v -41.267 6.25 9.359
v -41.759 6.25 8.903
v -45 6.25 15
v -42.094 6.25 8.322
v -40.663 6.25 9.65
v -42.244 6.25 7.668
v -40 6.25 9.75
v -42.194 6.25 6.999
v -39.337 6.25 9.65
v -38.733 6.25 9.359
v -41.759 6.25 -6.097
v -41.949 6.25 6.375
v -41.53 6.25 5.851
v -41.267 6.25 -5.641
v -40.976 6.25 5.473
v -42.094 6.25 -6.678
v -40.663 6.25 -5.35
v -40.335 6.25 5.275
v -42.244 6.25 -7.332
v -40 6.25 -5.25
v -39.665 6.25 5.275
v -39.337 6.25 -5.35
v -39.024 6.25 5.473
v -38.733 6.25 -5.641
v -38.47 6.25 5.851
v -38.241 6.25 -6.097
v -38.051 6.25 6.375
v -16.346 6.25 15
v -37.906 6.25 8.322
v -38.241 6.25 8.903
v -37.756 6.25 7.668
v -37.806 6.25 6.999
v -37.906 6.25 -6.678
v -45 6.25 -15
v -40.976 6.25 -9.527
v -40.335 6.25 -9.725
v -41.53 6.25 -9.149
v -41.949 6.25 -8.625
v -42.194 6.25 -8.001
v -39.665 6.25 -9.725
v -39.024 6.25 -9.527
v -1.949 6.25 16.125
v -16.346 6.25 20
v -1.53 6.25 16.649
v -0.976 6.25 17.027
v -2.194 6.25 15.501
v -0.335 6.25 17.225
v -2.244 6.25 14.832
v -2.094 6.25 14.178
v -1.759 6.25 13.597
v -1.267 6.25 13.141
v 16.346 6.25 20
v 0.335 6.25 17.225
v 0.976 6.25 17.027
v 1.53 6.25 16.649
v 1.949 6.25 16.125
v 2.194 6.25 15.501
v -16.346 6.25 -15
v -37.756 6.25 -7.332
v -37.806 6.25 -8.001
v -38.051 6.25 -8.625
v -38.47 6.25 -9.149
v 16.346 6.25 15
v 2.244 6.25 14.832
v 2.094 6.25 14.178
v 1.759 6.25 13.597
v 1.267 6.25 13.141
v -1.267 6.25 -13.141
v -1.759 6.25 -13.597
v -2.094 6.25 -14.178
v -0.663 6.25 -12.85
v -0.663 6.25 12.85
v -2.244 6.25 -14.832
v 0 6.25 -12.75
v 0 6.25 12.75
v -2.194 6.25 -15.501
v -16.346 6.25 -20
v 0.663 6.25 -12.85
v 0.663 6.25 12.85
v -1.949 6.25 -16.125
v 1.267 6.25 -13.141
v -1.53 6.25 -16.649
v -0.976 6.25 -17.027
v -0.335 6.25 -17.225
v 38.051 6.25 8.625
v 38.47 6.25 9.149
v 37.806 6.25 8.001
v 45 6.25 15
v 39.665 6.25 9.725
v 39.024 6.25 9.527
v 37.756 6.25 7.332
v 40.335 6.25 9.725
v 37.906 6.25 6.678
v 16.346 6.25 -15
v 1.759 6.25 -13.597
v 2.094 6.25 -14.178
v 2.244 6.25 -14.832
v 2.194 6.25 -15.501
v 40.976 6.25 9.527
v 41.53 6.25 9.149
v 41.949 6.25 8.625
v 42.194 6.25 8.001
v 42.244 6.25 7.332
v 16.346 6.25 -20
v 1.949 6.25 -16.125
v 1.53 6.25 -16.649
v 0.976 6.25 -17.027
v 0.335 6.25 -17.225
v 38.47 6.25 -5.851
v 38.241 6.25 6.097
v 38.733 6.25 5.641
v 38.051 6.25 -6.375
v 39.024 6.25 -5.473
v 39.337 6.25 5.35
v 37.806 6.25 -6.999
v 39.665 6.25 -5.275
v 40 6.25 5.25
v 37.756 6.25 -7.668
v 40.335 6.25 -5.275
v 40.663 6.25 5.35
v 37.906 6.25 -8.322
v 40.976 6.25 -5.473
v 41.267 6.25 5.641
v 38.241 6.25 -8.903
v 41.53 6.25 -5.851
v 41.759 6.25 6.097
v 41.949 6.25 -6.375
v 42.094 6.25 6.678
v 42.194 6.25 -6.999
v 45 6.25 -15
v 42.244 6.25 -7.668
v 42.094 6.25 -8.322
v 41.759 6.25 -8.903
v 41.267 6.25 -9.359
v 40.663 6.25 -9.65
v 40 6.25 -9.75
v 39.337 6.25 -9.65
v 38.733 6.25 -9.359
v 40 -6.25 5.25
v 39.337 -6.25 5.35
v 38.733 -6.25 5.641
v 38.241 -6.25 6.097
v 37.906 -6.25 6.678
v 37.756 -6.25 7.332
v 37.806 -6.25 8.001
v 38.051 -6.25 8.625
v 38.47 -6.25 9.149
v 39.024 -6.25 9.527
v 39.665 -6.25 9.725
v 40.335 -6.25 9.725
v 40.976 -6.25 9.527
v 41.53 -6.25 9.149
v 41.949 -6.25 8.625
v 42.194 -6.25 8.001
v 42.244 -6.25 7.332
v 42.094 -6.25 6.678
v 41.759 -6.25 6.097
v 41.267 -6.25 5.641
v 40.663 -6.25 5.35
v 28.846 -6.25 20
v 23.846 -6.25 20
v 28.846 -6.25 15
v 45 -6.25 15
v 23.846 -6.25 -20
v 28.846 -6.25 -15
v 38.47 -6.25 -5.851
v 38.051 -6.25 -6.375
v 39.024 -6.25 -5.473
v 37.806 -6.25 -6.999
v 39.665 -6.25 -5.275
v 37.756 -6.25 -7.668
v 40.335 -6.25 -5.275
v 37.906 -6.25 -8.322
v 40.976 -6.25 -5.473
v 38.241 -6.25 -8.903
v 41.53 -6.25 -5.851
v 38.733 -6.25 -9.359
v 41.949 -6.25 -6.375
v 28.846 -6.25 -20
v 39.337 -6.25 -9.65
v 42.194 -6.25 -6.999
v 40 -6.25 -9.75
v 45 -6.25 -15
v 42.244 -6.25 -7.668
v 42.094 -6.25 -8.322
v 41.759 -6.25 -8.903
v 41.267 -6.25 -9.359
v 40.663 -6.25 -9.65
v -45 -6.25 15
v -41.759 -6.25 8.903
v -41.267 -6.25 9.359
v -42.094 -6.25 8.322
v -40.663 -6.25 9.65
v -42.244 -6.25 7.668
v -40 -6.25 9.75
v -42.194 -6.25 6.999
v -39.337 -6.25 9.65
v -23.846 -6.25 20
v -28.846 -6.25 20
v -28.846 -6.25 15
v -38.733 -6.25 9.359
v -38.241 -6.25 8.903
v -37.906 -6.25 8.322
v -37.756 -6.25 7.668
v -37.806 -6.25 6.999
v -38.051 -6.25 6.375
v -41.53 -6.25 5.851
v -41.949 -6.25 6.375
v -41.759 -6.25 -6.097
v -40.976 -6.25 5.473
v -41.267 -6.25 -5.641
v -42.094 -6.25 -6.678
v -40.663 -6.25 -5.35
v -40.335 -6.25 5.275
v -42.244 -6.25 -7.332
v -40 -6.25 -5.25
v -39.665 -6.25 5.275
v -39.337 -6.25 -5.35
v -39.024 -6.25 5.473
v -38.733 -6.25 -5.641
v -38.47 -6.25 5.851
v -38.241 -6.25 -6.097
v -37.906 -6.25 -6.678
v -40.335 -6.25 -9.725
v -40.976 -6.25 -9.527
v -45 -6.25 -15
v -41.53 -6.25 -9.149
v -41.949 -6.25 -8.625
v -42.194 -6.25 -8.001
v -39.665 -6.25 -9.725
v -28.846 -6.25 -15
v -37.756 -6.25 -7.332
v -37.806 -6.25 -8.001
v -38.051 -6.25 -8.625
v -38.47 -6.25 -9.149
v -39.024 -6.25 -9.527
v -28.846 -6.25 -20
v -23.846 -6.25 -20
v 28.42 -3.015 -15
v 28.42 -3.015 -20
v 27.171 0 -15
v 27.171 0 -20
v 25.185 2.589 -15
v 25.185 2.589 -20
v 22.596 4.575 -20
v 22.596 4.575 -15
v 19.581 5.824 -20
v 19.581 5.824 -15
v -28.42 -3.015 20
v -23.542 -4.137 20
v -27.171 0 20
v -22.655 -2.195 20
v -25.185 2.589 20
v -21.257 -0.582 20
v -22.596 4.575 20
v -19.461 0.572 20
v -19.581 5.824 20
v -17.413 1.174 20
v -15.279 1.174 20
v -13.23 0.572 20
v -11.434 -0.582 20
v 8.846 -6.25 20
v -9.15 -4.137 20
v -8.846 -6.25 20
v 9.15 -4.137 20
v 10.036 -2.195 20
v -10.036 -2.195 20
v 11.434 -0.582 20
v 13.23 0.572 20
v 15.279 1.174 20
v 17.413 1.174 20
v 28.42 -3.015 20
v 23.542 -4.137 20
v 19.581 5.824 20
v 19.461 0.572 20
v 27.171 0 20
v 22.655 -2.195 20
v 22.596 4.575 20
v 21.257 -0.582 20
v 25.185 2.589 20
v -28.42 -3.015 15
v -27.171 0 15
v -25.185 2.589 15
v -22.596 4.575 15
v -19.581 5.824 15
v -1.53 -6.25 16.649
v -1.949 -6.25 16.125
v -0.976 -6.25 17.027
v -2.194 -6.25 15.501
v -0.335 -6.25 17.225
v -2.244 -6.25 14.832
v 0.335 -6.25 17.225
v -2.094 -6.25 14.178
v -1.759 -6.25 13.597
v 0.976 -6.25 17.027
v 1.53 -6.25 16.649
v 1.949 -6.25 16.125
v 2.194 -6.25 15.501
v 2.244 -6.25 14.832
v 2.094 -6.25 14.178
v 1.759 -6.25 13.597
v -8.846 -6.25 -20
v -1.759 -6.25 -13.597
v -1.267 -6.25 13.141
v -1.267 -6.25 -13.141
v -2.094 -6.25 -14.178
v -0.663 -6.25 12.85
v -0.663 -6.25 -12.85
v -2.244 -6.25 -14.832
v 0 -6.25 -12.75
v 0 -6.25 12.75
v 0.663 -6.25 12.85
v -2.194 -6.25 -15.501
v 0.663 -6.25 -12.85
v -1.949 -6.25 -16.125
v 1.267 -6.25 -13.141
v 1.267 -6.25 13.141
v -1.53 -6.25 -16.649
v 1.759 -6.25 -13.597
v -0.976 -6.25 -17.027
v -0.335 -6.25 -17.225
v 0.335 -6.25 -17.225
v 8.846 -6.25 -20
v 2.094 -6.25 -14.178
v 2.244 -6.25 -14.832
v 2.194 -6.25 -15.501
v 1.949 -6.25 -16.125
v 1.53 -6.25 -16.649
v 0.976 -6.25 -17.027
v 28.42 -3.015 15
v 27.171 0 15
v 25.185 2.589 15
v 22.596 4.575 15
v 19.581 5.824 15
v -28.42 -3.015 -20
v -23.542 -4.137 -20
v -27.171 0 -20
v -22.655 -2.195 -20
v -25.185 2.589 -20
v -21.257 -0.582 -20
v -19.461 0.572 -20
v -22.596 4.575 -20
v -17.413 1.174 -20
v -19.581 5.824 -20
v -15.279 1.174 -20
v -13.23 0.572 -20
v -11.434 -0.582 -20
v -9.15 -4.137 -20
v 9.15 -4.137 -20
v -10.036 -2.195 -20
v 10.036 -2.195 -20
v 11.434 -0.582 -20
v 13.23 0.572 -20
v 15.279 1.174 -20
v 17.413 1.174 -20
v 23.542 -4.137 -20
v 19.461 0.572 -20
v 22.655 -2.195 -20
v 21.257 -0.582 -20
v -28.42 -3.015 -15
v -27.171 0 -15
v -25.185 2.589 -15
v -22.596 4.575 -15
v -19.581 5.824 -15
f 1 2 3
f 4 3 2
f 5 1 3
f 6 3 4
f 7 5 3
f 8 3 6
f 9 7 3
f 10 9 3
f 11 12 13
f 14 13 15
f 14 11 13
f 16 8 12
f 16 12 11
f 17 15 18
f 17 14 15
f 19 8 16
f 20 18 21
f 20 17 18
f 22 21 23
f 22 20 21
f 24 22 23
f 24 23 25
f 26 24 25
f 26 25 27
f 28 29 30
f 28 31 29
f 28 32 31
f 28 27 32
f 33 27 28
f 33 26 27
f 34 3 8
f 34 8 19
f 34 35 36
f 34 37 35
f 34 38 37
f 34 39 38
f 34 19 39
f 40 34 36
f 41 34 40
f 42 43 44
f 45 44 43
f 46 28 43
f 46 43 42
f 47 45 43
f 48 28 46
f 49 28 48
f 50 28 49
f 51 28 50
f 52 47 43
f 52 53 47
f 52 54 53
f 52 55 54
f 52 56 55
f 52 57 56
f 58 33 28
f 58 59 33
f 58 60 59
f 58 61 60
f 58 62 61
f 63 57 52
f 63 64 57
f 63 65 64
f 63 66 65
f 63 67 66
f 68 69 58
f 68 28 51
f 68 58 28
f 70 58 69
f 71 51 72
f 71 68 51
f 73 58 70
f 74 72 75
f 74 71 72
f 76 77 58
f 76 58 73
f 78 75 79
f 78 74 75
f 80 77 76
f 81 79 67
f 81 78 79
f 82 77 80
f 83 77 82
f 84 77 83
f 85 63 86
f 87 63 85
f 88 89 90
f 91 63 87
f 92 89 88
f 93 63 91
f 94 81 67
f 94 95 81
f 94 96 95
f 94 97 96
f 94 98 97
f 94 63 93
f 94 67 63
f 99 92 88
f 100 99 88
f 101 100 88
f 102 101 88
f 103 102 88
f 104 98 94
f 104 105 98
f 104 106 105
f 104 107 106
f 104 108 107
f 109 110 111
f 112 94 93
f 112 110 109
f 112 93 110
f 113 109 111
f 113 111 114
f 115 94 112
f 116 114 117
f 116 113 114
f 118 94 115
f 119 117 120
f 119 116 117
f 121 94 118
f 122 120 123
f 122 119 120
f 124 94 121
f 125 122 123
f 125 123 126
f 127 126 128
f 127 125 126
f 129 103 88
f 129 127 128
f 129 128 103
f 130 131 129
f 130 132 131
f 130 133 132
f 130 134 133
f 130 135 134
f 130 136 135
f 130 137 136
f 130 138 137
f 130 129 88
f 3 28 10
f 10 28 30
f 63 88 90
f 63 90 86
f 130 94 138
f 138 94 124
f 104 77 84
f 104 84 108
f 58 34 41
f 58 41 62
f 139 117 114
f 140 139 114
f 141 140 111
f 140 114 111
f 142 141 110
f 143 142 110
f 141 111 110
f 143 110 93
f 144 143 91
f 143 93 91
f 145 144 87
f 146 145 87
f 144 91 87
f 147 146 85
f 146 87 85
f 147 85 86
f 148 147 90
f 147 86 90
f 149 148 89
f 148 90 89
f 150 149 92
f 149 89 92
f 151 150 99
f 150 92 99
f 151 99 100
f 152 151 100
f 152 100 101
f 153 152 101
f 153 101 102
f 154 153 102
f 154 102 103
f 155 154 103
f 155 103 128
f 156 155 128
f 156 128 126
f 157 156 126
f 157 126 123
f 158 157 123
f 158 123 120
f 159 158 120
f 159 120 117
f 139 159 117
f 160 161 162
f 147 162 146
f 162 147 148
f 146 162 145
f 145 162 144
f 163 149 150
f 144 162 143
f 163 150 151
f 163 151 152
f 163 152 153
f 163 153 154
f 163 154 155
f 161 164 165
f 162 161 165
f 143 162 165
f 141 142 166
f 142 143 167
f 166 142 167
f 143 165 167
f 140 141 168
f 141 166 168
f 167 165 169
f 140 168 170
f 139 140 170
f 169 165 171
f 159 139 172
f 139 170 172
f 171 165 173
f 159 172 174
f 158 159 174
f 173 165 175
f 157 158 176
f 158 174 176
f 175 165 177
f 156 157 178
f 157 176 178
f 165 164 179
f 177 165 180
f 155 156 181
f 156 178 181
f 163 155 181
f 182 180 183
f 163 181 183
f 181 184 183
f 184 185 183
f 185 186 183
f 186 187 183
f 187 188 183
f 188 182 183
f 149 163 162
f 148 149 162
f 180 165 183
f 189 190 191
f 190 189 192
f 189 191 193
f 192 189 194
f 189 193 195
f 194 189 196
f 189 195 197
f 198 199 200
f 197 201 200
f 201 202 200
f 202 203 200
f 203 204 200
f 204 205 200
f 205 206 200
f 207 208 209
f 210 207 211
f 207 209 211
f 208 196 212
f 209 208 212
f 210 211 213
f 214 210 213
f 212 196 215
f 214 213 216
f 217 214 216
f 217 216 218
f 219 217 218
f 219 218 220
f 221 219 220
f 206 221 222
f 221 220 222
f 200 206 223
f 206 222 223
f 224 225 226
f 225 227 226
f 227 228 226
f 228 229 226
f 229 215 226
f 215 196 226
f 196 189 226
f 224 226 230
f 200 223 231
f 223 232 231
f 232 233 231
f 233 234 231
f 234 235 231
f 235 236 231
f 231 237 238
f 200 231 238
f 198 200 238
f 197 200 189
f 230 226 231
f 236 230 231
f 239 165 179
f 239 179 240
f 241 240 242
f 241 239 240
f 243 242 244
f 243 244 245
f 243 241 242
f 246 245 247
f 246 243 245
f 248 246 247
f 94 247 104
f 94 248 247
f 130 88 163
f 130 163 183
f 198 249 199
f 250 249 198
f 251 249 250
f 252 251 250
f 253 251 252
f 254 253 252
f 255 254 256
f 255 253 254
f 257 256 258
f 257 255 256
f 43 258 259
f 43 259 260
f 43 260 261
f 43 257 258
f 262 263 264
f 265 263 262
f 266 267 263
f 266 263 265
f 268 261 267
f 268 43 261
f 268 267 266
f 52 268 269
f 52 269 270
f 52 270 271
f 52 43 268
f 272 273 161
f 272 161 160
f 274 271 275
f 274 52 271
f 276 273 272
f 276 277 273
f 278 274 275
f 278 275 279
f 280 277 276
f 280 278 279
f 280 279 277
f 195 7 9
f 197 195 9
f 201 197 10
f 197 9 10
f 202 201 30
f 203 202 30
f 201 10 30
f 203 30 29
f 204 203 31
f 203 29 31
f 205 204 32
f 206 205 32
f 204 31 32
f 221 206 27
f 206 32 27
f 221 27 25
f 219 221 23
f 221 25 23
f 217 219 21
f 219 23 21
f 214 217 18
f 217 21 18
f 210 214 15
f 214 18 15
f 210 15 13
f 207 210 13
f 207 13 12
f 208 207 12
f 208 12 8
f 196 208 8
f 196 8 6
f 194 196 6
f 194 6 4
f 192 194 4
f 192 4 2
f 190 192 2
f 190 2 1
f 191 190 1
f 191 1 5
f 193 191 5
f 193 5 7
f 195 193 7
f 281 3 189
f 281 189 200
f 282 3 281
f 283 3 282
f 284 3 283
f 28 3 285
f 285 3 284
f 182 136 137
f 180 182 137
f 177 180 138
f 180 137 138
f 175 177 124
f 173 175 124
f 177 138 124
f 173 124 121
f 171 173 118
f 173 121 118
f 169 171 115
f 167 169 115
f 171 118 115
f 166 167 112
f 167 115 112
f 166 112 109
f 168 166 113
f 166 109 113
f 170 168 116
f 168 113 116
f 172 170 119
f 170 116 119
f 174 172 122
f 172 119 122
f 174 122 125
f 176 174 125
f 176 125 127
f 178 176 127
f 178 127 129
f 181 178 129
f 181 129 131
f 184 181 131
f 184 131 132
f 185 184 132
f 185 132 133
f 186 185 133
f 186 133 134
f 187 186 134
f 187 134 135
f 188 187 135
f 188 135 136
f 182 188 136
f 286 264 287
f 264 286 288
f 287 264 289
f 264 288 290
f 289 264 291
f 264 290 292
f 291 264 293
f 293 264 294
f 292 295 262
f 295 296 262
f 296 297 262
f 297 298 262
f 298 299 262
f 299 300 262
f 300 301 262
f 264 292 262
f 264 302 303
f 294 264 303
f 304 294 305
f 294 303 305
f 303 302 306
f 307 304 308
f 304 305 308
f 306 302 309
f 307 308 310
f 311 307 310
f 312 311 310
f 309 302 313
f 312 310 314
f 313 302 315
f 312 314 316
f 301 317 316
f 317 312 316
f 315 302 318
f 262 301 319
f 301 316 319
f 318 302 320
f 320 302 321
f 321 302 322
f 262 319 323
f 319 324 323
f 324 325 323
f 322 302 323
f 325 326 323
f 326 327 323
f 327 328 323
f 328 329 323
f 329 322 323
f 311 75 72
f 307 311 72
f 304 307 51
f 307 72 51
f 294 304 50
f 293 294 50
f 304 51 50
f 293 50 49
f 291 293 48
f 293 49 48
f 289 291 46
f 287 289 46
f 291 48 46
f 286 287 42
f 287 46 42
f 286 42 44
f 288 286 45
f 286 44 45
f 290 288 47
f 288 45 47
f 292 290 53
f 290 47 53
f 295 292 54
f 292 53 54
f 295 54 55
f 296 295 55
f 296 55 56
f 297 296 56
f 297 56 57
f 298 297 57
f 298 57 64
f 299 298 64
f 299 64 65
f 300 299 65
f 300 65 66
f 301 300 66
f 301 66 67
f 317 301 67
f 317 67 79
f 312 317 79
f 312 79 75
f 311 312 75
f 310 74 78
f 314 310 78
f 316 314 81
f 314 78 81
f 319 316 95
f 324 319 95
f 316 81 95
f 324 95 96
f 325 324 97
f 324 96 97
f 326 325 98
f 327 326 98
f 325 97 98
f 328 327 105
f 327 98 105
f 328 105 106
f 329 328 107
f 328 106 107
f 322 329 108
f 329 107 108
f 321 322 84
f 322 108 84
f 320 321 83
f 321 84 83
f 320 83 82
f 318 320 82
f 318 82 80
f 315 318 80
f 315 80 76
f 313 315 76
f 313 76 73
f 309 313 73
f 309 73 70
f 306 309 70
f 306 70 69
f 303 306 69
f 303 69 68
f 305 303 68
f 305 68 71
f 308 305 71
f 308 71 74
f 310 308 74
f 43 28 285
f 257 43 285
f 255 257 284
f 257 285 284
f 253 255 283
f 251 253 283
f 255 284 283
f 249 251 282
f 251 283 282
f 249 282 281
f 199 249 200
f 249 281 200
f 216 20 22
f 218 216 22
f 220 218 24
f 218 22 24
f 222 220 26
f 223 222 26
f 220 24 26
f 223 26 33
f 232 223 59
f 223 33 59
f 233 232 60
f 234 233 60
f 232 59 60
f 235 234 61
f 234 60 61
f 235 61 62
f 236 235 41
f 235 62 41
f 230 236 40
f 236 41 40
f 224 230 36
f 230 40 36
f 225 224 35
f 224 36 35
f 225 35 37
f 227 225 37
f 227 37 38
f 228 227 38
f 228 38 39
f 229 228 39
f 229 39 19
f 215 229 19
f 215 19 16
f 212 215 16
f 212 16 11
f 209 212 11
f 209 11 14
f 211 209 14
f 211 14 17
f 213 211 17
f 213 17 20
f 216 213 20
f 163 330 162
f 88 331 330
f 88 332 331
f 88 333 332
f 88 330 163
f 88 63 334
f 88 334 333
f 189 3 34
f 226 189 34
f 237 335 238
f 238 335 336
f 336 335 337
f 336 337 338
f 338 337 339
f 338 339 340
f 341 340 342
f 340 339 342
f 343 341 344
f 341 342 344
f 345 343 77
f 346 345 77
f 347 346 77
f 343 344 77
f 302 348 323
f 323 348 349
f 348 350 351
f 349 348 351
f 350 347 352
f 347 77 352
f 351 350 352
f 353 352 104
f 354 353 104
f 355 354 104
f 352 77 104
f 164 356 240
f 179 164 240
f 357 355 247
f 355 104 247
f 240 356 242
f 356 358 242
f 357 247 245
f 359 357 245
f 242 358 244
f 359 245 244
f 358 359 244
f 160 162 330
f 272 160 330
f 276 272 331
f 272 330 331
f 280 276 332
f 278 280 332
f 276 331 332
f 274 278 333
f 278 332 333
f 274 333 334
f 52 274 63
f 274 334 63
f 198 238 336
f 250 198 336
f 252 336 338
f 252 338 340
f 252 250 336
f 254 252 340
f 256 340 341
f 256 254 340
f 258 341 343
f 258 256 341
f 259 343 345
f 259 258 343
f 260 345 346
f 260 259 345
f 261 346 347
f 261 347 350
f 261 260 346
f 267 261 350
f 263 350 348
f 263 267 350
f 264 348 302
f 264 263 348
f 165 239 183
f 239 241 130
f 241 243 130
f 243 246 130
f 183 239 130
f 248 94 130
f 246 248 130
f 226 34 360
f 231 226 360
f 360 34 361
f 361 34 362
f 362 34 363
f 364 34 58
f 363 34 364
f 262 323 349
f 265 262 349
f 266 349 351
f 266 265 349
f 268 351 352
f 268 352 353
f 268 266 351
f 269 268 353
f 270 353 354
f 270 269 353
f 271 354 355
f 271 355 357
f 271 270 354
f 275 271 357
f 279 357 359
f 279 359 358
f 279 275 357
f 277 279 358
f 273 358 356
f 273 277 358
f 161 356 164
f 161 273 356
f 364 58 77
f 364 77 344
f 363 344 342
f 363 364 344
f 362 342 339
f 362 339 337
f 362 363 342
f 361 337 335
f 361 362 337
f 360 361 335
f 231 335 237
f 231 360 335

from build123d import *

# Parameters (mm, degrees)
SKETCH1_W           = 90
SKETCH1_H           = 30
BOSS_EXTRUDE1_DEPTH = 6.25
BOSS_EXTRUDE3_DEPTH = 5
CUT_EXTRUDE1_DEPTH  = 41
SKETCH6_R           = 2.25
CUT_EXTRUDE2_DEPTH  = 13.5


with BuildPart() as part:
    # Sketch1 → Boss-Extrude1 (new body, symmetric)
    with BuildSketch(Plane(origin=(0, 0, 0), x_dir=(1, 0, 0), z_dir=(0, 1, 0))):
        Rectangle(SKETCH1_W, SKETCH1_H)
    extrude(amount=BOSS_EXTRUDE1_DEPTH, both=True)

    # Sketch3 → Boss-Extrude3 (add)
    with BuildSketch(Plane.XY.offset(15)):
        with BuildLine():
            Line((-28.845871038, -6.25), (-23.845871038, -6.25))
            ThreePointArc((-23.845871038, -6.25), (-16.345871038, 1.25), (-8.845871038, -6.25))
            Line((-8.845871038, -6.25), (8.845871038, -6.25))
            ThreePointArc((8.845871038, -6.25), (16.345871038, 1.25), (23.845871038, -6.25))
            Line((23.845871038, -6.25), (28.845871038, -6.25))
            ThreePointArc((28.845871038, -6.25), (25.184705803, 2.588834765), (16.345871038, 6.25))
            Line((16.345871038, 6.25), (-16.345871038, 6.25))
            ThreePointArc((-16.345871038, 6.25), (-25.184705803, 2.588834765), (-28.845871038, -6.25))
        make_face()
    boss_extrude3 = extrude(amount=BOSS_EXTRUDE3_DEPTH)

    # Mirror1: Boss-Extrude3 across plane
    add(boss_extrude3.mirror(Plane.XY))

    # Sketch5 → Cut-Extrude1 (cut)
    with BuildSketch(Plane.XY.offset(15)):
        with BuildLine():
            Line((-23.845871038, -6.25), (-8.845871038, -6.25))
            ThreePointArc((-8.845871038, -6.25), (-16.345871038, 1.25), (-23.845871038, -6.25))
        make_face()
        with BuildLine():
            Line((8.845871038, -6.25), (23.845871038, -6.25))
            ThreePointArc((23.845871038, -6.25), (16.345871038, 1.25), (8.845871038, -6.25))
        make_face()
    extrude(amount=-CUT_EXTRUDE1_DEPTH, mode=Mode.SUBTRACT)

    # Sketch6 → Cut-Extrude2 (cut, through all)
    with BuildSketch(Plane(origin=(0, 6.25, 0), x_dir=(1, 0, 0), z_dir=(0, 1, 0))):
        with Locations(Location((-40, 7.5, 0), (0, 0, 270))):  # turned: the seam where the file's is
            Circle(SKETCH6_R)
        with Locations(Location((-40, -7.5, 0), (0, 0, 270))):  # turned: the seam where the file's is
            Circle(SKETCH6_R)
        with Locations(Location((40, -7.5, 0), (0, 0, 90))):  # turned: the seam where the file's is
            Circle(SKETCH6_R)
        with Locations(Location((40, 7.5, 0), (0, 0, 90))):  # turned: the seam where the file's is
            Circle(SKETCH6_R)
        with Locations(Location((0, 15, 0), (0, 0, 270))):  # turned: the seam where the file's is
            Circle(SKETCH6_R)
        with Locations(Location((0, -15, 0), (0, 0, 90))):  # turned: the seam where the file's is
            Circle(SKETCH6_R)
    extrude(amount=-CUT_EXTRUDE2_DEPTH, mode=Mode.SUBTRACT)


solid = part.part
